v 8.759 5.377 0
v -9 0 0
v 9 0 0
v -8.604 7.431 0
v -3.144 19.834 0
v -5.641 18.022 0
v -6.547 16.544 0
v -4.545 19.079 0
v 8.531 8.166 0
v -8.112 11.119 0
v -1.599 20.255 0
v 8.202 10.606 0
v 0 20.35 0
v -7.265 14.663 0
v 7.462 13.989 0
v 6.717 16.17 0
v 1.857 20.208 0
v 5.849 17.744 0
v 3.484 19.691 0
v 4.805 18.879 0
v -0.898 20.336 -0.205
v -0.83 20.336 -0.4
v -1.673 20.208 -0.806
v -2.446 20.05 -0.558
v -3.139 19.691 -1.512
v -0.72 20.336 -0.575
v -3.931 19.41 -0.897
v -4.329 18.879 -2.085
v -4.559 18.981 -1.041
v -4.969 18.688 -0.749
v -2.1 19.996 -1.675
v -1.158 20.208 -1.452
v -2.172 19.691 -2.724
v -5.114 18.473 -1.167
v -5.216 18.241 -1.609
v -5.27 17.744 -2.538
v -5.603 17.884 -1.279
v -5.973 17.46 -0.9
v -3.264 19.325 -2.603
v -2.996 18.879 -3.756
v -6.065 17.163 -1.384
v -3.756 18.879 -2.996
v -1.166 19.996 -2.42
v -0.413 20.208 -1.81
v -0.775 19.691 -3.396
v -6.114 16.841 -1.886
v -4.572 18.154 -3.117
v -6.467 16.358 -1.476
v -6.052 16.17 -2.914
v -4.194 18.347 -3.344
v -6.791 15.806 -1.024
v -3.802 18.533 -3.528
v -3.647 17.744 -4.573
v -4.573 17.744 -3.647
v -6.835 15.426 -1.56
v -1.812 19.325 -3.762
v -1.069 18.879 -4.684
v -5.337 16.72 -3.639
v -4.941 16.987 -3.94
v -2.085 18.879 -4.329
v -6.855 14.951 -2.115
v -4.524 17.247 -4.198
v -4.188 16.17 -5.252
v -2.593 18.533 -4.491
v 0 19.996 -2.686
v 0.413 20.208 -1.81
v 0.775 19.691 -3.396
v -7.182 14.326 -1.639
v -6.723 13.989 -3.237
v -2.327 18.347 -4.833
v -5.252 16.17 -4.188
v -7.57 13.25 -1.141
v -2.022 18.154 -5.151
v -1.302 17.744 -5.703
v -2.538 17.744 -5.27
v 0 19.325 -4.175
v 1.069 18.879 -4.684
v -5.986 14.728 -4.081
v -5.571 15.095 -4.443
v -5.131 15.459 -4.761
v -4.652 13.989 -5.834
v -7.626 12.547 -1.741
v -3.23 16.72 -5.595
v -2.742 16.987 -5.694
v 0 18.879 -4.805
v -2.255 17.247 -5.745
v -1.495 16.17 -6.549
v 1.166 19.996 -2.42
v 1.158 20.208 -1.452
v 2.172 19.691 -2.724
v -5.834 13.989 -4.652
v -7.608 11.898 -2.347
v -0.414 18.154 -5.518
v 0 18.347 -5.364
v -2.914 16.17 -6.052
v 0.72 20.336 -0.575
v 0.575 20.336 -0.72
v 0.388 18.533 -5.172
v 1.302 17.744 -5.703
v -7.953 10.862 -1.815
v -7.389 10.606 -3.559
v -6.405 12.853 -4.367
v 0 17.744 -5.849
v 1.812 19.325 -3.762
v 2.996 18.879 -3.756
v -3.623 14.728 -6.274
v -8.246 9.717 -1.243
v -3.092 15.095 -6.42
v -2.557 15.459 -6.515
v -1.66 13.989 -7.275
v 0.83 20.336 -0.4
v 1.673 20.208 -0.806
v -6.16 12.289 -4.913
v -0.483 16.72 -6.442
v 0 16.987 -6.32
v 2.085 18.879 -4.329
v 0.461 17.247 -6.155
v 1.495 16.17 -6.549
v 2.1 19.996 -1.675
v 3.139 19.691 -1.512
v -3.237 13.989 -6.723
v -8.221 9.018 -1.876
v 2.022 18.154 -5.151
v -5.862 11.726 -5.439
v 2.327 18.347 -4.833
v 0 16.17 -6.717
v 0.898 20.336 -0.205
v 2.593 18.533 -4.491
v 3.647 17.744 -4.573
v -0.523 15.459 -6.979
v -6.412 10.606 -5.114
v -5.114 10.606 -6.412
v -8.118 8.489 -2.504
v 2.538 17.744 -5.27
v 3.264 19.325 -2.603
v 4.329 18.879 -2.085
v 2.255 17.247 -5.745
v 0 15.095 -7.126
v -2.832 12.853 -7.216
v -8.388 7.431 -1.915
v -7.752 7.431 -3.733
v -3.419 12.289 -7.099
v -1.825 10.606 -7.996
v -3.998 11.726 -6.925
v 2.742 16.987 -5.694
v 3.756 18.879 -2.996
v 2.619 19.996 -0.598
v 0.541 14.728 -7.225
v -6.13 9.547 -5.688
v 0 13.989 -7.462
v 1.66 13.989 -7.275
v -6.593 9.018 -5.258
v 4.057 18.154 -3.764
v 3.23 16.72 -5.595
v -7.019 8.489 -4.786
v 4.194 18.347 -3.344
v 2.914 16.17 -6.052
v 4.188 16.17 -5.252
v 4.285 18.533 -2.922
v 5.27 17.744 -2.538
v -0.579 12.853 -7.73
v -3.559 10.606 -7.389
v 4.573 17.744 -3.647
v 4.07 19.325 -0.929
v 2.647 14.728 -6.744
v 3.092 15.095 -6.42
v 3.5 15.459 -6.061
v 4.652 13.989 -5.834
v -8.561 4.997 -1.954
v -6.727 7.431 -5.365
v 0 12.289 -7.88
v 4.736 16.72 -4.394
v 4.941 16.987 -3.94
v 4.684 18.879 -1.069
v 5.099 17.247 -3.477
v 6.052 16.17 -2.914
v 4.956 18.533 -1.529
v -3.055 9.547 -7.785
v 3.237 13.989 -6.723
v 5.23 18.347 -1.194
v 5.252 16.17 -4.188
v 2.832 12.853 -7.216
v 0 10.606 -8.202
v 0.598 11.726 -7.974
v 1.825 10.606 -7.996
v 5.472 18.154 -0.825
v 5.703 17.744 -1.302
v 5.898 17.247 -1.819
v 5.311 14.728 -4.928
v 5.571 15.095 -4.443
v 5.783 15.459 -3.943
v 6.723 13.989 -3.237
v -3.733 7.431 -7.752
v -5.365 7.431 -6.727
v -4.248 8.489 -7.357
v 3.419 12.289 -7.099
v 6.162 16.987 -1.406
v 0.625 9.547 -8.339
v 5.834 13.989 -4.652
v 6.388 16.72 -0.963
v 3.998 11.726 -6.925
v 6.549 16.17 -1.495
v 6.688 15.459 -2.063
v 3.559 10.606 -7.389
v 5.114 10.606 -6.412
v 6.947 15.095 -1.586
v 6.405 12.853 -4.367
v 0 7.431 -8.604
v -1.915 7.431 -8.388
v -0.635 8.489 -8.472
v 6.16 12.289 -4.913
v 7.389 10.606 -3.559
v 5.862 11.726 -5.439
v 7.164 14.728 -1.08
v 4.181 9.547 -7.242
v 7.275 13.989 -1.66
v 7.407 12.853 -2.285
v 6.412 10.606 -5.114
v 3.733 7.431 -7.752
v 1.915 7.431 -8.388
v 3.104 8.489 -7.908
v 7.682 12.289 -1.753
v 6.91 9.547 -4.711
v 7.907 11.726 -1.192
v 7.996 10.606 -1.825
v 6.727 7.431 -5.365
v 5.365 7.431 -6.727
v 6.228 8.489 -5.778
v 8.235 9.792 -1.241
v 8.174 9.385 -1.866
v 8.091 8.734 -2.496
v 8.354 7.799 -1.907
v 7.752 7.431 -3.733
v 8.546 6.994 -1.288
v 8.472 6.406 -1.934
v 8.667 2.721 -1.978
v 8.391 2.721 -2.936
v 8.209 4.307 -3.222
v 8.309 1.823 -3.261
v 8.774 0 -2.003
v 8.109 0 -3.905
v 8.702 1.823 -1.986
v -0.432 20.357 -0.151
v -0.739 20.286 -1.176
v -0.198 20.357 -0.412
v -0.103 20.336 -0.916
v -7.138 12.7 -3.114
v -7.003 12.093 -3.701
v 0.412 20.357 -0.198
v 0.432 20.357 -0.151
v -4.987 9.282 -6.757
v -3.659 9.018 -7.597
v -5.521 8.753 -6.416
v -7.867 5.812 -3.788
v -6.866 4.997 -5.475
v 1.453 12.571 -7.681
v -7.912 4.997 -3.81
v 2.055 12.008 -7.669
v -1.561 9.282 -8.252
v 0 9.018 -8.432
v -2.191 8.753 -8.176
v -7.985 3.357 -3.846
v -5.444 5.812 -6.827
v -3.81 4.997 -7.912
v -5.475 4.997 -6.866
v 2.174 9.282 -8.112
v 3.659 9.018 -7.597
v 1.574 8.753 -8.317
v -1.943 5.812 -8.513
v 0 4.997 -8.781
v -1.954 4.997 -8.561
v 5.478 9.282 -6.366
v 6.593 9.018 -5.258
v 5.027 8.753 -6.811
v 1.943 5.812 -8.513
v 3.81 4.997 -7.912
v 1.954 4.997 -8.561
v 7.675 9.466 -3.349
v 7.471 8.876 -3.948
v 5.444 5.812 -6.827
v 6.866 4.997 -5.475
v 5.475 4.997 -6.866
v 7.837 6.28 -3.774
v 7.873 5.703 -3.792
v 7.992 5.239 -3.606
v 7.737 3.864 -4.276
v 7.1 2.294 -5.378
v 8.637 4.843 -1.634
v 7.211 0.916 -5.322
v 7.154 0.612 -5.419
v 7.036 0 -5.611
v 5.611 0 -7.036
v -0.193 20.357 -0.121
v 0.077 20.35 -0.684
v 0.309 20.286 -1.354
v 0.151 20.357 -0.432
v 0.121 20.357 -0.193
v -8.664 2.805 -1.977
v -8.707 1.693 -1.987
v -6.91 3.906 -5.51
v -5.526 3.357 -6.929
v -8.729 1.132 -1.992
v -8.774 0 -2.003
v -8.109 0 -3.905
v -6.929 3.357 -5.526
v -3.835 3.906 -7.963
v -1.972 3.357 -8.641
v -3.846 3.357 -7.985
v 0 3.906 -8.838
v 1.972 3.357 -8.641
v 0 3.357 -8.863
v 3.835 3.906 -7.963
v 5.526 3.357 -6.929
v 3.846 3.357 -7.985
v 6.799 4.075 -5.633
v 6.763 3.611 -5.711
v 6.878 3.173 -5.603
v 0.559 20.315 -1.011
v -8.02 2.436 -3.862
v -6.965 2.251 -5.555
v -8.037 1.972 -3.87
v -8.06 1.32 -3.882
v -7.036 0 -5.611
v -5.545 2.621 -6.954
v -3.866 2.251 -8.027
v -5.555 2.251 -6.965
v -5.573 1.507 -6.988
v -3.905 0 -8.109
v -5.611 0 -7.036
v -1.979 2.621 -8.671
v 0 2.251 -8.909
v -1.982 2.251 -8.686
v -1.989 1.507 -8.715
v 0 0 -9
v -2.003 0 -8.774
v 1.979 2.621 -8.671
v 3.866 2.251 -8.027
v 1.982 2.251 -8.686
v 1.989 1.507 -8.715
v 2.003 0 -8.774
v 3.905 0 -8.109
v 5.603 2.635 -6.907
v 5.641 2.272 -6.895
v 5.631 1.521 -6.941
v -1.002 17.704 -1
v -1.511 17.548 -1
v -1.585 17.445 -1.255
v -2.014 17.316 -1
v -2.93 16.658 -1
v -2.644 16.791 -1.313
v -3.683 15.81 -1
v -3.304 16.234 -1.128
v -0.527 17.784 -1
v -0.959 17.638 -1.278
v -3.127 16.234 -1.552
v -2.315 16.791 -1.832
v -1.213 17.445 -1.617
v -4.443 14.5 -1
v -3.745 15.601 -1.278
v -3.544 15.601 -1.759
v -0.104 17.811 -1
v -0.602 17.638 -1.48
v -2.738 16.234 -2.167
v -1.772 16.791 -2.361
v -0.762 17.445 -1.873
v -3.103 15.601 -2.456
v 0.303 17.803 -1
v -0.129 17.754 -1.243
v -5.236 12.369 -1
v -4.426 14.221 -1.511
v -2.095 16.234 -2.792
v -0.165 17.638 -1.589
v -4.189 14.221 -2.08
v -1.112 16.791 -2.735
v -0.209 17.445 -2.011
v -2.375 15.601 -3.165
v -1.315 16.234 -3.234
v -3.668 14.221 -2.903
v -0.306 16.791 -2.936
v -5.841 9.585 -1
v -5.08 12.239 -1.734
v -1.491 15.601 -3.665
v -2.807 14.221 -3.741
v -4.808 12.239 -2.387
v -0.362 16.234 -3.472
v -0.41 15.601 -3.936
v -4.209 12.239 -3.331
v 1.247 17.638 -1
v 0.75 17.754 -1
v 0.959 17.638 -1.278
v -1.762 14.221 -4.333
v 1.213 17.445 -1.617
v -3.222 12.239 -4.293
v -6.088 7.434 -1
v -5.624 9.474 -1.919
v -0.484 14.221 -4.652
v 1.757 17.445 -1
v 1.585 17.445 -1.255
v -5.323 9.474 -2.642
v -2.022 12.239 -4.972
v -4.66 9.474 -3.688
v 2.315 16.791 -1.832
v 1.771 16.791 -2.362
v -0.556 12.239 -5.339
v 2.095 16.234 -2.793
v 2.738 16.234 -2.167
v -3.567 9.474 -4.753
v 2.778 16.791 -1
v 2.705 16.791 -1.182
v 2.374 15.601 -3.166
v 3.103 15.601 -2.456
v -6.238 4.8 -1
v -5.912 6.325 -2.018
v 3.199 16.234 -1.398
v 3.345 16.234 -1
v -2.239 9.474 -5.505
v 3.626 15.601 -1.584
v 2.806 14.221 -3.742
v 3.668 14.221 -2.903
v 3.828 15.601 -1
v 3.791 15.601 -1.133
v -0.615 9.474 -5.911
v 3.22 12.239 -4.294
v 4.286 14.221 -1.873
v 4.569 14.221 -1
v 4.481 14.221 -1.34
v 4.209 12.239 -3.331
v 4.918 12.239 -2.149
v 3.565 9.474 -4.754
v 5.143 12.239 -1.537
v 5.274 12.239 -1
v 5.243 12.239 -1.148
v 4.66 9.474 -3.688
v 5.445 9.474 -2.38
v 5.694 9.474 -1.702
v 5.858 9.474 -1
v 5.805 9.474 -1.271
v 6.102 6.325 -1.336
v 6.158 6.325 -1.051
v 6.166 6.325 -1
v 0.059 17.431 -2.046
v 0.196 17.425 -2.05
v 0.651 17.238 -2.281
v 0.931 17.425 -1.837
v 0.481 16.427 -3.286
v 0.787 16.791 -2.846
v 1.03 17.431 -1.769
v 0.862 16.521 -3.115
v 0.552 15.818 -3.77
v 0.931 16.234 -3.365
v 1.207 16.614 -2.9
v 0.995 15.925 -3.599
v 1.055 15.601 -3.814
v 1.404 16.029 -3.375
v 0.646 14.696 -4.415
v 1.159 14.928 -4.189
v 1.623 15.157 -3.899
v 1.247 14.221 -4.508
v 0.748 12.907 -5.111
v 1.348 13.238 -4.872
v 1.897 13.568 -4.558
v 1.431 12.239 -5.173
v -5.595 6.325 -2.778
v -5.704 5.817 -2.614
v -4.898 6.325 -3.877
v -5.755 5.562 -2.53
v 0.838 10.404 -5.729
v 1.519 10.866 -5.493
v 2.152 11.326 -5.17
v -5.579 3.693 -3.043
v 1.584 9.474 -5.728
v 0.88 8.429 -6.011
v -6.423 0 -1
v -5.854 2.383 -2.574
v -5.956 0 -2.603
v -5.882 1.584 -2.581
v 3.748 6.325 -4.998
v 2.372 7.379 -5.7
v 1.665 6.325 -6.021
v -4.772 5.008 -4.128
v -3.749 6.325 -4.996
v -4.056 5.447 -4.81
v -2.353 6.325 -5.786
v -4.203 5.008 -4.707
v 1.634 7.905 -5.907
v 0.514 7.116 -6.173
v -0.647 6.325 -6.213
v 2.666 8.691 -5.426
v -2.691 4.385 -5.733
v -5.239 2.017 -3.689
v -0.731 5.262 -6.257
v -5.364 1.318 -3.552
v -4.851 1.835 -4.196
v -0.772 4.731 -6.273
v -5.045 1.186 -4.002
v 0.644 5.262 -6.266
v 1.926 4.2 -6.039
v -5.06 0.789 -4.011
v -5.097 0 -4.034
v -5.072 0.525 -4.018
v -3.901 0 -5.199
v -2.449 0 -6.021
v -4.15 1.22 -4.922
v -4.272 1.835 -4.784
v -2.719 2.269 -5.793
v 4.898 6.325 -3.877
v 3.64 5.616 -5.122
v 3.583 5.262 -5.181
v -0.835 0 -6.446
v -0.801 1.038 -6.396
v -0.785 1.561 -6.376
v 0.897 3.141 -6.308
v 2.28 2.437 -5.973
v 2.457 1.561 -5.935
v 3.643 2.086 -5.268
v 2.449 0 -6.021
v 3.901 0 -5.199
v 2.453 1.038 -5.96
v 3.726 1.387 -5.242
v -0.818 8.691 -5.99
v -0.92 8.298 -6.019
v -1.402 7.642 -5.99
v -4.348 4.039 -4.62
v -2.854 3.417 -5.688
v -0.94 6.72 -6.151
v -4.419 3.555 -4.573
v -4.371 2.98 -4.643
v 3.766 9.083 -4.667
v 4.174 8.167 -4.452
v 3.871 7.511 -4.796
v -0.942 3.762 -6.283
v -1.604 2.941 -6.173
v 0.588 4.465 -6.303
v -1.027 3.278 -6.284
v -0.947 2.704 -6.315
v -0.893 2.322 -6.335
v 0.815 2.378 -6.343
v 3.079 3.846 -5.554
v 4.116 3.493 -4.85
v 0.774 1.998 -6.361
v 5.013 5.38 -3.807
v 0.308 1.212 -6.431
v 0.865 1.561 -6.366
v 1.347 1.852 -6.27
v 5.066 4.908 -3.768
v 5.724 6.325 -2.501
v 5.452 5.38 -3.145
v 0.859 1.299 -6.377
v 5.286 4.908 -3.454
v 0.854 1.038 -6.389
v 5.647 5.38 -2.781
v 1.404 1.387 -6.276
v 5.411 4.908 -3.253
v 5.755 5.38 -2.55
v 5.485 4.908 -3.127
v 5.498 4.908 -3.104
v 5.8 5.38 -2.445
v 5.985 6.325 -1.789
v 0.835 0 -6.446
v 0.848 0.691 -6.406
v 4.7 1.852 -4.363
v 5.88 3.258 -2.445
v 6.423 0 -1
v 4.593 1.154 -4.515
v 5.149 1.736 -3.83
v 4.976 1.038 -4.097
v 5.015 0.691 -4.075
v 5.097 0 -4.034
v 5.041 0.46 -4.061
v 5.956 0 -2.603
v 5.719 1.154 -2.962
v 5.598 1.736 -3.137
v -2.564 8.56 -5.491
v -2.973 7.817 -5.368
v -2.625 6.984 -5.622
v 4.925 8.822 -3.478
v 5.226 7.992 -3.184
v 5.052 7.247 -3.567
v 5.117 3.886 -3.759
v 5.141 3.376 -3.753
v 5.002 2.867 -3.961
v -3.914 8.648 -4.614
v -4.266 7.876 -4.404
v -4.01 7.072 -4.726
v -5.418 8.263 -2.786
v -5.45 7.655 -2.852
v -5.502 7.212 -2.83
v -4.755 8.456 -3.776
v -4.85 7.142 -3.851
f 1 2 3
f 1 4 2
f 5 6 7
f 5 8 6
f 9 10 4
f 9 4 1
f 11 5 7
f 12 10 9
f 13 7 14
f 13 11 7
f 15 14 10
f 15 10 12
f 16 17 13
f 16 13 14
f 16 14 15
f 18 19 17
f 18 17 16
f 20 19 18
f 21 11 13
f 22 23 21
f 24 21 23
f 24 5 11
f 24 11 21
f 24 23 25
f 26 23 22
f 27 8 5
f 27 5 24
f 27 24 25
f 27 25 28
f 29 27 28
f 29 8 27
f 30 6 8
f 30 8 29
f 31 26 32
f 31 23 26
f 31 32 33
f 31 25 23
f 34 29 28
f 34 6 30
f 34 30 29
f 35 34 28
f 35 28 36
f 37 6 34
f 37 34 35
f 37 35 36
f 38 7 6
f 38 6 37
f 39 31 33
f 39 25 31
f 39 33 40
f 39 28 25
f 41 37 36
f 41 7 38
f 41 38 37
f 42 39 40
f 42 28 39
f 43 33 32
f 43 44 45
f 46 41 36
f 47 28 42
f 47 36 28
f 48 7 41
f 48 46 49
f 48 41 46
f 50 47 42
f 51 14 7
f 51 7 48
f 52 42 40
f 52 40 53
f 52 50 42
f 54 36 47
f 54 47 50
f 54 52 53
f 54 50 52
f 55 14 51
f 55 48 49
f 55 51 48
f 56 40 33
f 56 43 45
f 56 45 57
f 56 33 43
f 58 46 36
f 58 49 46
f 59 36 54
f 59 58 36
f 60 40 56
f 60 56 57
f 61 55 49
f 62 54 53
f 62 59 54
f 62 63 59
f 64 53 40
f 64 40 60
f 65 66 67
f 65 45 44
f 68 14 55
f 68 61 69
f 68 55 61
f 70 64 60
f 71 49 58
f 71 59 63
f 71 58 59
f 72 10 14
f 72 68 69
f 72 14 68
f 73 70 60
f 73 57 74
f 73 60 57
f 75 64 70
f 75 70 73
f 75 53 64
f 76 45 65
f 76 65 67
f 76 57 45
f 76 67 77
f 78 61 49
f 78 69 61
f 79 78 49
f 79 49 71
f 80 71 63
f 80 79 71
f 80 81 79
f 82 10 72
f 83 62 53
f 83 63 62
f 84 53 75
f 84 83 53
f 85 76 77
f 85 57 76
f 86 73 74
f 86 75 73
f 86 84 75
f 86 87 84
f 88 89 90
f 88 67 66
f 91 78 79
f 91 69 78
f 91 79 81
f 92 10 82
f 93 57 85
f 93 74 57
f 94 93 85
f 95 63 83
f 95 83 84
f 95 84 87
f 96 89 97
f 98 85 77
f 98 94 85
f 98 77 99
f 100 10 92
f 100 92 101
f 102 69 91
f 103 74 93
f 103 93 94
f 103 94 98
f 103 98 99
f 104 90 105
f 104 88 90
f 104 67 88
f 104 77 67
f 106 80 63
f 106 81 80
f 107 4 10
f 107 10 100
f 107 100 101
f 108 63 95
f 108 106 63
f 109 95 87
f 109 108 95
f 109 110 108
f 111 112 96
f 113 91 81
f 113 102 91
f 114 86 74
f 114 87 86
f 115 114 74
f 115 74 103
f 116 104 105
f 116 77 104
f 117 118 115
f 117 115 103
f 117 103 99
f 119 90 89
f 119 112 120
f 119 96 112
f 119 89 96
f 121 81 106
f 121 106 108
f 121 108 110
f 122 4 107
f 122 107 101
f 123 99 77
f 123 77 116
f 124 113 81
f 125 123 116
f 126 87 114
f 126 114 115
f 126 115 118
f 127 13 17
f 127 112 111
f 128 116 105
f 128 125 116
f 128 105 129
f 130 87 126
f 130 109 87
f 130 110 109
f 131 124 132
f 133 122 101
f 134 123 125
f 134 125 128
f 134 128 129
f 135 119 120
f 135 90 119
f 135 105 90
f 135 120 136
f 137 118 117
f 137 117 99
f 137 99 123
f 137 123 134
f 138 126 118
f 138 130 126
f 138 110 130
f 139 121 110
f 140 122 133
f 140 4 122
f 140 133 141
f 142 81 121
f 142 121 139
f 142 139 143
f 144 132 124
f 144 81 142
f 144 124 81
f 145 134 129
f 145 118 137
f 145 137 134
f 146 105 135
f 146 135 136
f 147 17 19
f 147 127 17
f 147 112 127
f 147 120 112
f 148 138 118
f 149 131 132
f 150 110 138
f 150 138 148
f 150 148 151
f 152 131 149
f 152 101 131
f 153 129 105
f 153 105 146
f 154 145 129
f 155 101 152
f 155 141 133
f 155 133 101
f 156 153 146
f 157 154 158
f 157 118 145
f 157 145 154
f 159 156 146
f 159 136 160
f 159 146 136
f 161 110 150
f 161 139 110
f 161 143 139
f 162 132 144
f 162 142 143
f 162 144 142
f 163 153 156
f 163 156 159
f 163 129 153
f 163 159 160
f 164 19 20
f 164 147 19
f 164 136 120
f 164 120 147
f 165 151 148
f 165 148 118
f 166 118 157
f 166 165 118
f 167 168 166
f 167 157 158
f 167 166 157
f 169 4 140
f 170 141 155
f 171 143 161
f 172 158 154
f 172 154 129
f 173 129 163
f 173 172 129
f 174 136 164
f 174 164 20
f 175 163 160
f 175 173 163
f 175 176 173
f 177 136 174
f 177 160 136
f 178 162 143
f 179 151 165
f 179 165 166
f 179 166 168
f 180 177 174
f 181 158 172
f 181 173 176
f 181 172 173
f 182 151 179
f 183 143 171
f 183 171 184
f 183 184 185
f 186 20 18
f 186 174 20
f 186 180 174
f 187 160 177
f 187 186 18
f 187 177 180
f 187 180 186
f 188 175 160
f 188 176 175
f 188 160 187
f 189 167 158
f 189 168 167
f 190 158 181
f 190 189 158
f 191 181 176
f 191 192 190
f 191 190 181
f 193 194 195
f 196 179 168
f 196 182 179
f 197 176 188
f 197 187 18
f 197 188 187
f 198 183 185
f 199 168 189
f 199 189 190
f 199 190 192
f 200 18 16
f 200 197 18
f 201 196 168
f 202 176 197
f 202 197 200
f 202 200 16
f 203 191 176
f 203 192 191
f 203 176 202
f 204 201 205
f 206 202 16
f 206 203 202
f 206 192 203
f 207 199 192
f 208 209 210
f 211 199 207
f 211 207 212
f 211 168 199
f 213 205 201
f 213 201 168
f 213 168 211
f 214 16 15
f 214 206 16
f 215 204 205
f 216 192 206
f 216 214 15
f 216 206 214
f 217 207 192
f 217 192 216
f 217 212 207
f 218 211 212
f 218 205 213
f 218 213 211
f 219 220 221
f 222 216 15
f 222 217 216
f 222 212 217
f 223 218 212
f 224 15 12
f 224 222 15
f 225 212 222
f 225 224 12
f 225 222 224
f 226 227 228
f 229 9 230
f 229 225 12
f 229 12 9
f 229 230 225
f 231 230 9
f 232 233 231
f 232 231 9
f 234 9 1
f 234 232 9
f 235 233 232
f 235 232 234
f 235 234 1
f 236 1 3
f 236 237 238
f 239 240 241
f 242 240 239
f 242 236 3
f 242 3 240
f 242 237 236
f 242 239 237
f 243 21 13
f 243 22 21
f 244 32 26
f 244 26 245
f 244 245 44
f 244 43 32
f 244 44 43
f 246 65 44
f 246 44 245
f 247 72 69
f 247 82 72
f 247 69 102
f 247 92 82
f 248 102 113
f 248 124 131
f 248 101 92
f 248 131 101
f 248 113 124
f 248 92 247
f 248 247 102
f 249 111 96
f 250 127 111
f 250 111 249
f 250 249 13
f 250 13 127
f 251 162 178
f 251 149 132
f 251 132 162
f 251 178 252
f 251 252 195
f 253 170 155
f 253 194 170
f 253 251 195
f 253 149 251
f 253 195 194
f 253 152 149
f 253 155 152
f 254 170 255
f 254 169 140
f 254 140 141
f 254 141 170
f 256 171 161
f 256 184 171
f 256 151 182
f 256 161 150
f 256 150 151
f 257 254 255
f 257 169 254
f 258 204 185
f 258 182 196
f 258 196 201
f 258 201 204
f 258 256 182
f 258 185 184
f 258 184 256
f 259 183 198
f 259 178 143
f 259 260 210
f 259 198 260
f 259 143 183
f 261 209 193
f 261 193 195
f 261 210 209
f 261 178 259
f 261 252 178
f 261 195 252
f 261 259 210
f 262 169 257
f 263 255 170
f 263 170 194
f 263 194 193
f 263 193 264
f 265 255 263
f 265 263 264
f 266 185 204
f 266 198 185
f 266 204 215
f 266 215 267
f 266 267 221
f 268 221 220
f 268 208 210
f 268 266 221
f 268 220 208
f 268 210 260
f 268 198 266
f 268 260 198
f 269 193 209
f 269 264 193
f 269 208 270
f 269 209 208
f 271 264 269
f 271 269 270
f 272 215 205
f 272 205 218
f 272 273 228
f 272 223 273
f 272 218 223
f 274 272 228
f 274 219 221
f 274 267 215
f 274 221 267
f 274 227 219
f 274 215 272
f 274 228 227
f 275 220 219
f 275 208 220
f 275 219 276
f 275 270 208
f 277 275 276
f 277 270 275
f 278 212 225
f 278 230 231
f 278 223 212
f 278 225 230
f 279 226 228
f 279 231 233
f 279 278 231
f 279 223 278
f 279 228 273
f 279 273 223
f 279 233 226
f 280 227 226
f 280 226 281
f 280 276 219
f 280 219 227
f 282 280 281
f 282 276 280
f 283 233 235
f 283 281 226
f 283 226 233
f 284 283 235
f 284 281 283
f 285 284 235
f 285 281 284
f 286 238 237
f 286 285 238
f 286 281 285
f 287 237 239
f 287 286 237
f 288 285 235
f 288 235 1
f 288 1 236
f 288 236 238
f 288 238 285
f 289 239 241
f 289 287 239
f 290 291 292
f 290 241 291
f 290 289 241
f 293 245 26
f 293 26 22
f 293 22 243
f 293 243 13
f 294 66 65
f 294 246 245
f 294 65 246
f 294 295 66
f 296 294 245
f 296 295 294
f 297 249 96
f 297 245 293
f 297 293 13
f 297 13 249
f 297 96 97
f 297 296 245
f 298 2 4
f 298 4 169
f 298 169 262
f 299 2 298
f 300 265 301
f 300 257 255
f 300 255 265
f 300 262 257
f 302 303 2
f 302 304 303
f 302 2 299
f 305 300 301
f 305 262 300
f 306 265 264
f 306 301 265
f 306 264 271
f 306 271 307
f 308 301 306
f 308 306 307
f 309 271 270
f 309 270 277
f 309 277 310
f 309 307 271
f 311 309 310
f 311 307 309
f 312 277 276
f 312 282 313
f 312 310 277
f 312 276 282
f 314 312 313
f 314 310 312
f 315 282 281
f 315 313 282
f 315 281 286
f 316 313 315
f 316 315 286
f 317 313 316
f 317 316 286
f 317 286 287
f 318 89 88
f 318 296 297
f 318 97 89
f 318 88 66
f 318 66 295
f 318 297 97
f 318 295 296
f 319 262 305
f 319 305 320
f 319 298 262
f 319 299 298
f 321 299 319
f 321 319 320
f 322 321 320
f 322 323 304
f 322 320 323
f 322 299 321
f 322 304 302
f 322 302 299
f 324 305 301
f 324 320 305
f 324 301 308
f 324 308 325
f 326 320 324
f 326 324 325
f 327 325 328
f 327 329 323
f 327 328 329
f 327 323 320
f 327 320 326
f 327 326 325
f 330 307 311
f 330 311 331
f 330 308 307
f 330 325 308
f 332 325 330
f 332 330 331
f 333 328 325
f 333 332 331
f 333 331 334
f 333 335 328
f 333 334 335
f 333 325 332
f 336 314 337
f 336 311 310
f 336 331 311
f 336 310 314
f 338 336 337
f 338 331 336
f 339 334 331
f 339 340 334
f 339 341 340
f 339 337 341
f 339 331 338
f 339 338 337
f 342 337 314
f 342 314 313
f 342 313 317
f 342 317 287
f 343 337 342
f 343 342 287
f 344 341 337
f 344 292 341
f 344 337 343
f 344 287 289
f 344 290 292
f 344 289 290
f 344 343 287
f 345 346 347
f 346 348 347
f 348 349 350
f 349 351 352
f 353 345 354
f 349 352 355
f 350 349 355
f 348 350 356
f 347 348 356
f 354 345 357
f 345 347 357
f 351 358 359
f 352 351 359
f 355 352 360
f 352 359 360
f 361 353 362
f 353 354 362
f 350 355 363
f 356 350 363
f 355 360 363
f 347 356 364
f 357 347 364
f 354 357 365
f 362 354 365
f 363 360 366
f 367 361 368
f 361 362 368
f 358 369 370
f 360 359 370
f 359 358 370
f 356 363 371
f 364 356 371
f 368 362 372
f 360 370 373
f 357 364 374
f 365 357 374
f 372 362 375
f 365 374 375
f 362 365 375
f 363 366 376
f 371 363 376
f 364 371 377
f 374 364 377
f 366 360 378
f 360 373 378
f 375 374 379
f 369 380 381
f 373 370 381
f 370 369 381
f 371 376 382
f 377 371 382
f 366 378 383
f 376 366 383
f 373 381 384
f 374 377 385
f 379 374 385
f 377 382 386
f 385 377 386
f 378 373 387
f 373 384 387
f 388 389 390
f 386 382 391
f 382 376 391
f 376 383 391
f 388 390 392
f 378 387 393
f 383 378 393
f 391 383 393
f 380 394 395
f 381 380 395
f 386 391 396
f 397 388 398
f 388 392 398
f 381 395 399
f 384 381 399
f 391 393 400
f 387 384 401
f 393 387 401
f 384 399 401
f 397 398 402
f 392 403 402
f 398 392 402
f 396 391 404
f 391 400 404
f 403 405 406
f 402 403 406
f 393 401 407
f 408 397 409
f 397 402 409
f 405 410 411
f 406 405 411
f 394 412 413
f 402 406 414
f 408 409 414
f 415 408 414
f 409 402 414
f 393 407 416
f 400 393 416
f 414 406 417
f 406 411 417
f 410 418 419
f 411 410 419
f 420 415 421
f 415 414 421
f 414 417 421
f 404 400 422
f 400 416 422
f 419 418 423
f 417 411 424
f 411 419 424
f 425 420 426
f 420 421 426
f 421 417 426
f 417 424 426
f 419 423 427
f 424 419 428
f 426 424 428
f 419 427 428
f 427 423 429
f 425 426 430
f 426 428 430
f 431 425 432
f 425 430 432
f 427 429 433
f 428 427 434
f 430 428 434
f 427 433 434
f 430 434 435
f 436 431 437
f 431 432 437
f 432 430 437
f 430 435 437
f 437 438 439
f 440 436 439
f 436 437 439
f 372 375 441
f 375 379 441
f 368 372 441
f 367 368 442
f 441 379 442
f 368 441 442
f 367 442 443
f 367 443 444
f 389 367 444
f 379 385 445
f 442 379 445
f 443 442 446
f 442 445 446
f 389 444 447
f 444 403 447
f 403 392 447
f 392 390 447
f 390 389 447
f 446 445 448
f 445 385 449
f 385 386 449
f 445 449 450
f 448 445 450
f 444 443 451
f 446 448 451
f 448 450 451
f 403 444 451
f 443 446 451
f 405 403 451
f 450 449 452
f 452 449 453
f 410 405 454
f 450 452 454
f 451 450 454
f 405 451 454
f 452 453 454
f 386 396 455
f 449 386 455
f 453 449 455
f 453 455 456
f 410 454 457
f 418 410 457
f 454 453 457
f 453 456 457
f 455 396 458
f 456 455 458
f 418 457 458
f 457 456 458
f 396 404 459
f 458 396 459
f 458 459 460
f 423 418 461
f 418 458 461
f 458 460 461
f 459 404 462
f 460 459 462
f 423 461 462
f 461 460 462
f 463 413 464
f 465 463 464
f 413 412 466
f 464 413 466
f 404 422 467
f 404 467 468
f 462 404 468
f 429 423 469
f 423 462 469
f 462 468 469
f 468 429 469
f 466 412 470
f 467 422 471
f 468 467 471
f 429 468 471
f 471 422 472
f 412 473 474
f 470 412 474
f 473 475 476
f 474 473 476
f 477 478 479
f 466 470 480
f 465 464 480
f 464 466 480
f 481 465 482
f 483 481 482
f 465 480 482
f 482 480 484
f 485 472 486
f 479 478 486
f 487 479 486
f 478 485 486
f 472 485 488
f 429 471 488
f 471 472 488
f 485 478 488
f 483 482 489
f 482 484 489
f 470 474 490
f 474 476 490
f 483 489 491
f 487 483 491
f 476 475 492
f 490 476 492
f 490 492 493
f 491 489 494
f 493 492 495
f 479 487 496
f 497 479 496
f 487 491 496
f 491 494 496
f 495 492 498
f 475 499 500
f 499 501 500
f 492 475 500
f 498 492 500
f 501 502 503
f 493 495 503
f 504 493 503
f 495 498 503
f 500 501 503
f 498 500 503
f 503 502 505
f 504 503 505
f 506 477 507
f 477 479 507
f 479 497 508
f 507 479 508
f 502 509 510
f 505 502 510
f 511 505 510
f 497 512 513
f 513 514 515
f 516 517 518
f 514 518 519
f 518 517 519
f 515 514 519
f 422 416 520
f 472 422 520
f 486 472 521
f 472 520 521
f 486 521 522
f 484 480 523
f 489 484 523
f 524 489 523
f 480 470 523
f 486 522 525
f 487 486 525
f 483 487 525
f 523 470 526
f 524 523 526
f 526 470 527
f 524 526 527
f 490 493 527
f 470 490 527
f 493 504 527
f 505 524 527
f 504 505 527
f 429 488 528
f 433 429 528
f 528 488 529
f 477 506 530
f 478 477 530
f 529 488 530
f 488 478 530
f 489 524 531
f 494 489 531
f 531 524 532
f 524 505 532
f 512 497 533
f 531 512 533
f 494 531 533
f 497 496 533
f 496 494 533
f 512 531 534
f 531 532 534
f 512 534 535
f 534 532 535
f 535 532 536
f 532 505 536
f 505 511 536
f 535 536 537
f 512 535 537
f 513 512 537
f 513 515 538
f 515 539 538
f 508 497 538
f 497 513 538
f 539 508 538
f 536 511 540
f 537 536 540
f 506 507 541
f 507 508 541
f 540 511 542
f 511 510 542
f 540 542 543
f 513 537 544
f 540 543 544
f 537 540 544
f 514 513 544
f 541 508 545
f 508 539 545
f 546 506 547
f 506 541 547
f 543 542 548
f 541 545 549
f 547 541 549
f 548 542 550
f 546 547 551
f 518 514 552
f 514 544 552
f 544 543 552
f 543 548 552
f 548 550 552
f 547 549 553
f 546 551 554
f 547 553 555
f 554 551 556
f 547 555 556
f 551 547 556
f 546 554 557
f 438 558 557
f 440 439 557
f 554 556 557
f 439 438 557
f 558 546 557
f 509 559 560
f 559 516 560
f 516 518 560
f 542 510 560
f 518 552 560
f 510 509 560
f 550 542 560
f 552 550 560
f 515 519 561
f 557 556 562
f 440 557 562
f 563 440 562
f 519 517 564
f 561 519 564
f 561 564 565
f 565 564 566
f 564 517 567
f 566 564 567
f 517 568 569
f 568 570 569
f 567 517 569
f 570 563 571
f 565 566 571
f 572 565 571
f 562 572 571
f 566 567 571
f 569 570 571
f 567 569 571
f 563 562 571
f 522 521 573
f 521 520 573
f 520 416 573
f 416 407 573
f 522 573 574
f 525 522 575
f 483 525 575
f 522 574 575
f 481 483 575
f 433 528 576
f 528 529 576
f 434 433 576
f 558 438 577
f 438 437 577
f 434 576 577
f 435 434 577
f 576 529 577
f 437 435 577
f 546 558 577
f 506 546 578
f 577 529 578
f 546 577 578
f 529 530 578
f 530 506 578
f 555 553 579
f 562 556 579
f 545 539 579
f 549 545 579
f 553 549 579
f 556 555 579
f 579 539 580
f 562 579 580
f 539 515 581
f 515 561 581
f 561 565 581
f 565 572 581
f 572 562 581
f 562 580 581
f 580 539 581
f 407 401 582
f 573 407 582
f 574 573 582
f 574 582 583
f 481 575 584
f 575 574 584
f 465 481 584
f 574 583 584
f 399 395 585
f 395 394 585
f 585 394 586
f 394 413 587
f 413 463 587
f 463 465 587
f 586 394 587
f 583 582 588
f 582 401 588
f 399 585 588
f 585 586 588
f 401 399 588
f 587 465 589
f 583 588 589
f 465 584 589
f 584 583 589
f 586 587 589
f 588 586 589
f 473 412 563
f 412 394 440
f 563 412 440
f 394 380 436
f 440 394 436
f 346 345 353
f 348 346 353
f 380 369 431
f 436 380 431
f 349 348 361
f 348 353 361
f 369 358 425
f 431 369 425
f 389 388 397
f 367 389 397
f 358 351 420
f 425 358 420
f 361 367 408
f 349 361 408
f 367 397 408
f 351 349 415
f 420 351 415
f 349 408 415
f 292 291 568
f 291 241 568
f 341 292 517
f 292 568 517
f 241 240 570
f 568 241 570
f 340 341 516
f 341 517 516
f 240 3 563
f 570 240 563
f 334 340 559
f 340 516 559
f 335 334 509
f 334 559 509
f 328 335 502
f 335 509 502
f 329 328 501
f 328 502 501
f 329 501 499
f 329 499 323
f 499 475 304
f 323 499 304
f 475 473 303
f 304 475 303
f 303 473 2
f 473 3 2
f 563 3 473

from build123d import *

# Parameters (mm, degrees)
SKETCH2_W           = 22.16775651
SKETCH2_H           = 25.111868119
CUT_EXTRUDE1_DEPTH  = 9
BOSS_EXTRUDE1_DEPTH = 1


with BuildPart() as part:
    # Sketch1 → Revolve1 (revolve)
    with BuildSketch(Plane.XY):
        with BuildLine():
            Line((6.5, 0), (9, 0))
            add(Edge.make_bspline(
                [(0, 20.35), (1.675966842, 20.428176516), (5.66035993, 19.372470149), (8.740520085, 10.941984052), (8.794057121, 4.785623995), (9, 0)],
                knots=[0, 0, 0, 0, 0.209086974, 0.440428739, 1, 1, 1, 1], degree=3))
            Line((0, 20.35), (0, 17.85))
            add(Edge.make_bspline(
                [(0, 17.85), (1.248468613, 18.003104069), (3.434295374, 16.83334968), (6.617297319, 10.514055415), (6.220398856, 4.532307189), (6.5, 0)],
                knots=[0, 0, 0, 0, 0.174730572, 0.328981961, 1, 1, 1, 1], degree=3))
        make_face()
    revolve(axis=Axis((0, 24.080193906, 0), (0, -1, 0)))

    # Sketch2 → Cut-Extrude1 (cut)
    with BuildSketch(Plane.XY.offset(9)):
        with Locations((0.864101602, 11.007607196)):
            Rectangle(SKETCH2_W, SKETCH2_H)
    extrude(amount=-CUT_EXTRUDE1_DEPTH, mode=Mode.SUBTRACT)

    # Sketch3 → Boss-Extrude1 (add)
    with BuildSketch(Plane.XY):
        with BuildLine():
            Line((-7.75, 0), (7.75, 0))
            add(Edge.make_bspline(
                [(-7.75, 0), (-8.003711251, 4.491264664), (-7.661665361, 10.48327828), (-4.662420922, 18.274599737), (0.148702201, 19.617208041), (4.677365419, 17.883192424), (7.773890001, 10.39627401), (7.411285563, 4.341150012), (7.75, 0)],
                knots=[0, 0, 0, 0, 0.289463592, 0.419223785, 0.501869976, 0.592483788, 0.714941347, 1, 1, 1, 1], degree=3))
        make_face()
    extrude(amount=-BOSS_EXTRUDE1_DEPTH)


solid = part.part
